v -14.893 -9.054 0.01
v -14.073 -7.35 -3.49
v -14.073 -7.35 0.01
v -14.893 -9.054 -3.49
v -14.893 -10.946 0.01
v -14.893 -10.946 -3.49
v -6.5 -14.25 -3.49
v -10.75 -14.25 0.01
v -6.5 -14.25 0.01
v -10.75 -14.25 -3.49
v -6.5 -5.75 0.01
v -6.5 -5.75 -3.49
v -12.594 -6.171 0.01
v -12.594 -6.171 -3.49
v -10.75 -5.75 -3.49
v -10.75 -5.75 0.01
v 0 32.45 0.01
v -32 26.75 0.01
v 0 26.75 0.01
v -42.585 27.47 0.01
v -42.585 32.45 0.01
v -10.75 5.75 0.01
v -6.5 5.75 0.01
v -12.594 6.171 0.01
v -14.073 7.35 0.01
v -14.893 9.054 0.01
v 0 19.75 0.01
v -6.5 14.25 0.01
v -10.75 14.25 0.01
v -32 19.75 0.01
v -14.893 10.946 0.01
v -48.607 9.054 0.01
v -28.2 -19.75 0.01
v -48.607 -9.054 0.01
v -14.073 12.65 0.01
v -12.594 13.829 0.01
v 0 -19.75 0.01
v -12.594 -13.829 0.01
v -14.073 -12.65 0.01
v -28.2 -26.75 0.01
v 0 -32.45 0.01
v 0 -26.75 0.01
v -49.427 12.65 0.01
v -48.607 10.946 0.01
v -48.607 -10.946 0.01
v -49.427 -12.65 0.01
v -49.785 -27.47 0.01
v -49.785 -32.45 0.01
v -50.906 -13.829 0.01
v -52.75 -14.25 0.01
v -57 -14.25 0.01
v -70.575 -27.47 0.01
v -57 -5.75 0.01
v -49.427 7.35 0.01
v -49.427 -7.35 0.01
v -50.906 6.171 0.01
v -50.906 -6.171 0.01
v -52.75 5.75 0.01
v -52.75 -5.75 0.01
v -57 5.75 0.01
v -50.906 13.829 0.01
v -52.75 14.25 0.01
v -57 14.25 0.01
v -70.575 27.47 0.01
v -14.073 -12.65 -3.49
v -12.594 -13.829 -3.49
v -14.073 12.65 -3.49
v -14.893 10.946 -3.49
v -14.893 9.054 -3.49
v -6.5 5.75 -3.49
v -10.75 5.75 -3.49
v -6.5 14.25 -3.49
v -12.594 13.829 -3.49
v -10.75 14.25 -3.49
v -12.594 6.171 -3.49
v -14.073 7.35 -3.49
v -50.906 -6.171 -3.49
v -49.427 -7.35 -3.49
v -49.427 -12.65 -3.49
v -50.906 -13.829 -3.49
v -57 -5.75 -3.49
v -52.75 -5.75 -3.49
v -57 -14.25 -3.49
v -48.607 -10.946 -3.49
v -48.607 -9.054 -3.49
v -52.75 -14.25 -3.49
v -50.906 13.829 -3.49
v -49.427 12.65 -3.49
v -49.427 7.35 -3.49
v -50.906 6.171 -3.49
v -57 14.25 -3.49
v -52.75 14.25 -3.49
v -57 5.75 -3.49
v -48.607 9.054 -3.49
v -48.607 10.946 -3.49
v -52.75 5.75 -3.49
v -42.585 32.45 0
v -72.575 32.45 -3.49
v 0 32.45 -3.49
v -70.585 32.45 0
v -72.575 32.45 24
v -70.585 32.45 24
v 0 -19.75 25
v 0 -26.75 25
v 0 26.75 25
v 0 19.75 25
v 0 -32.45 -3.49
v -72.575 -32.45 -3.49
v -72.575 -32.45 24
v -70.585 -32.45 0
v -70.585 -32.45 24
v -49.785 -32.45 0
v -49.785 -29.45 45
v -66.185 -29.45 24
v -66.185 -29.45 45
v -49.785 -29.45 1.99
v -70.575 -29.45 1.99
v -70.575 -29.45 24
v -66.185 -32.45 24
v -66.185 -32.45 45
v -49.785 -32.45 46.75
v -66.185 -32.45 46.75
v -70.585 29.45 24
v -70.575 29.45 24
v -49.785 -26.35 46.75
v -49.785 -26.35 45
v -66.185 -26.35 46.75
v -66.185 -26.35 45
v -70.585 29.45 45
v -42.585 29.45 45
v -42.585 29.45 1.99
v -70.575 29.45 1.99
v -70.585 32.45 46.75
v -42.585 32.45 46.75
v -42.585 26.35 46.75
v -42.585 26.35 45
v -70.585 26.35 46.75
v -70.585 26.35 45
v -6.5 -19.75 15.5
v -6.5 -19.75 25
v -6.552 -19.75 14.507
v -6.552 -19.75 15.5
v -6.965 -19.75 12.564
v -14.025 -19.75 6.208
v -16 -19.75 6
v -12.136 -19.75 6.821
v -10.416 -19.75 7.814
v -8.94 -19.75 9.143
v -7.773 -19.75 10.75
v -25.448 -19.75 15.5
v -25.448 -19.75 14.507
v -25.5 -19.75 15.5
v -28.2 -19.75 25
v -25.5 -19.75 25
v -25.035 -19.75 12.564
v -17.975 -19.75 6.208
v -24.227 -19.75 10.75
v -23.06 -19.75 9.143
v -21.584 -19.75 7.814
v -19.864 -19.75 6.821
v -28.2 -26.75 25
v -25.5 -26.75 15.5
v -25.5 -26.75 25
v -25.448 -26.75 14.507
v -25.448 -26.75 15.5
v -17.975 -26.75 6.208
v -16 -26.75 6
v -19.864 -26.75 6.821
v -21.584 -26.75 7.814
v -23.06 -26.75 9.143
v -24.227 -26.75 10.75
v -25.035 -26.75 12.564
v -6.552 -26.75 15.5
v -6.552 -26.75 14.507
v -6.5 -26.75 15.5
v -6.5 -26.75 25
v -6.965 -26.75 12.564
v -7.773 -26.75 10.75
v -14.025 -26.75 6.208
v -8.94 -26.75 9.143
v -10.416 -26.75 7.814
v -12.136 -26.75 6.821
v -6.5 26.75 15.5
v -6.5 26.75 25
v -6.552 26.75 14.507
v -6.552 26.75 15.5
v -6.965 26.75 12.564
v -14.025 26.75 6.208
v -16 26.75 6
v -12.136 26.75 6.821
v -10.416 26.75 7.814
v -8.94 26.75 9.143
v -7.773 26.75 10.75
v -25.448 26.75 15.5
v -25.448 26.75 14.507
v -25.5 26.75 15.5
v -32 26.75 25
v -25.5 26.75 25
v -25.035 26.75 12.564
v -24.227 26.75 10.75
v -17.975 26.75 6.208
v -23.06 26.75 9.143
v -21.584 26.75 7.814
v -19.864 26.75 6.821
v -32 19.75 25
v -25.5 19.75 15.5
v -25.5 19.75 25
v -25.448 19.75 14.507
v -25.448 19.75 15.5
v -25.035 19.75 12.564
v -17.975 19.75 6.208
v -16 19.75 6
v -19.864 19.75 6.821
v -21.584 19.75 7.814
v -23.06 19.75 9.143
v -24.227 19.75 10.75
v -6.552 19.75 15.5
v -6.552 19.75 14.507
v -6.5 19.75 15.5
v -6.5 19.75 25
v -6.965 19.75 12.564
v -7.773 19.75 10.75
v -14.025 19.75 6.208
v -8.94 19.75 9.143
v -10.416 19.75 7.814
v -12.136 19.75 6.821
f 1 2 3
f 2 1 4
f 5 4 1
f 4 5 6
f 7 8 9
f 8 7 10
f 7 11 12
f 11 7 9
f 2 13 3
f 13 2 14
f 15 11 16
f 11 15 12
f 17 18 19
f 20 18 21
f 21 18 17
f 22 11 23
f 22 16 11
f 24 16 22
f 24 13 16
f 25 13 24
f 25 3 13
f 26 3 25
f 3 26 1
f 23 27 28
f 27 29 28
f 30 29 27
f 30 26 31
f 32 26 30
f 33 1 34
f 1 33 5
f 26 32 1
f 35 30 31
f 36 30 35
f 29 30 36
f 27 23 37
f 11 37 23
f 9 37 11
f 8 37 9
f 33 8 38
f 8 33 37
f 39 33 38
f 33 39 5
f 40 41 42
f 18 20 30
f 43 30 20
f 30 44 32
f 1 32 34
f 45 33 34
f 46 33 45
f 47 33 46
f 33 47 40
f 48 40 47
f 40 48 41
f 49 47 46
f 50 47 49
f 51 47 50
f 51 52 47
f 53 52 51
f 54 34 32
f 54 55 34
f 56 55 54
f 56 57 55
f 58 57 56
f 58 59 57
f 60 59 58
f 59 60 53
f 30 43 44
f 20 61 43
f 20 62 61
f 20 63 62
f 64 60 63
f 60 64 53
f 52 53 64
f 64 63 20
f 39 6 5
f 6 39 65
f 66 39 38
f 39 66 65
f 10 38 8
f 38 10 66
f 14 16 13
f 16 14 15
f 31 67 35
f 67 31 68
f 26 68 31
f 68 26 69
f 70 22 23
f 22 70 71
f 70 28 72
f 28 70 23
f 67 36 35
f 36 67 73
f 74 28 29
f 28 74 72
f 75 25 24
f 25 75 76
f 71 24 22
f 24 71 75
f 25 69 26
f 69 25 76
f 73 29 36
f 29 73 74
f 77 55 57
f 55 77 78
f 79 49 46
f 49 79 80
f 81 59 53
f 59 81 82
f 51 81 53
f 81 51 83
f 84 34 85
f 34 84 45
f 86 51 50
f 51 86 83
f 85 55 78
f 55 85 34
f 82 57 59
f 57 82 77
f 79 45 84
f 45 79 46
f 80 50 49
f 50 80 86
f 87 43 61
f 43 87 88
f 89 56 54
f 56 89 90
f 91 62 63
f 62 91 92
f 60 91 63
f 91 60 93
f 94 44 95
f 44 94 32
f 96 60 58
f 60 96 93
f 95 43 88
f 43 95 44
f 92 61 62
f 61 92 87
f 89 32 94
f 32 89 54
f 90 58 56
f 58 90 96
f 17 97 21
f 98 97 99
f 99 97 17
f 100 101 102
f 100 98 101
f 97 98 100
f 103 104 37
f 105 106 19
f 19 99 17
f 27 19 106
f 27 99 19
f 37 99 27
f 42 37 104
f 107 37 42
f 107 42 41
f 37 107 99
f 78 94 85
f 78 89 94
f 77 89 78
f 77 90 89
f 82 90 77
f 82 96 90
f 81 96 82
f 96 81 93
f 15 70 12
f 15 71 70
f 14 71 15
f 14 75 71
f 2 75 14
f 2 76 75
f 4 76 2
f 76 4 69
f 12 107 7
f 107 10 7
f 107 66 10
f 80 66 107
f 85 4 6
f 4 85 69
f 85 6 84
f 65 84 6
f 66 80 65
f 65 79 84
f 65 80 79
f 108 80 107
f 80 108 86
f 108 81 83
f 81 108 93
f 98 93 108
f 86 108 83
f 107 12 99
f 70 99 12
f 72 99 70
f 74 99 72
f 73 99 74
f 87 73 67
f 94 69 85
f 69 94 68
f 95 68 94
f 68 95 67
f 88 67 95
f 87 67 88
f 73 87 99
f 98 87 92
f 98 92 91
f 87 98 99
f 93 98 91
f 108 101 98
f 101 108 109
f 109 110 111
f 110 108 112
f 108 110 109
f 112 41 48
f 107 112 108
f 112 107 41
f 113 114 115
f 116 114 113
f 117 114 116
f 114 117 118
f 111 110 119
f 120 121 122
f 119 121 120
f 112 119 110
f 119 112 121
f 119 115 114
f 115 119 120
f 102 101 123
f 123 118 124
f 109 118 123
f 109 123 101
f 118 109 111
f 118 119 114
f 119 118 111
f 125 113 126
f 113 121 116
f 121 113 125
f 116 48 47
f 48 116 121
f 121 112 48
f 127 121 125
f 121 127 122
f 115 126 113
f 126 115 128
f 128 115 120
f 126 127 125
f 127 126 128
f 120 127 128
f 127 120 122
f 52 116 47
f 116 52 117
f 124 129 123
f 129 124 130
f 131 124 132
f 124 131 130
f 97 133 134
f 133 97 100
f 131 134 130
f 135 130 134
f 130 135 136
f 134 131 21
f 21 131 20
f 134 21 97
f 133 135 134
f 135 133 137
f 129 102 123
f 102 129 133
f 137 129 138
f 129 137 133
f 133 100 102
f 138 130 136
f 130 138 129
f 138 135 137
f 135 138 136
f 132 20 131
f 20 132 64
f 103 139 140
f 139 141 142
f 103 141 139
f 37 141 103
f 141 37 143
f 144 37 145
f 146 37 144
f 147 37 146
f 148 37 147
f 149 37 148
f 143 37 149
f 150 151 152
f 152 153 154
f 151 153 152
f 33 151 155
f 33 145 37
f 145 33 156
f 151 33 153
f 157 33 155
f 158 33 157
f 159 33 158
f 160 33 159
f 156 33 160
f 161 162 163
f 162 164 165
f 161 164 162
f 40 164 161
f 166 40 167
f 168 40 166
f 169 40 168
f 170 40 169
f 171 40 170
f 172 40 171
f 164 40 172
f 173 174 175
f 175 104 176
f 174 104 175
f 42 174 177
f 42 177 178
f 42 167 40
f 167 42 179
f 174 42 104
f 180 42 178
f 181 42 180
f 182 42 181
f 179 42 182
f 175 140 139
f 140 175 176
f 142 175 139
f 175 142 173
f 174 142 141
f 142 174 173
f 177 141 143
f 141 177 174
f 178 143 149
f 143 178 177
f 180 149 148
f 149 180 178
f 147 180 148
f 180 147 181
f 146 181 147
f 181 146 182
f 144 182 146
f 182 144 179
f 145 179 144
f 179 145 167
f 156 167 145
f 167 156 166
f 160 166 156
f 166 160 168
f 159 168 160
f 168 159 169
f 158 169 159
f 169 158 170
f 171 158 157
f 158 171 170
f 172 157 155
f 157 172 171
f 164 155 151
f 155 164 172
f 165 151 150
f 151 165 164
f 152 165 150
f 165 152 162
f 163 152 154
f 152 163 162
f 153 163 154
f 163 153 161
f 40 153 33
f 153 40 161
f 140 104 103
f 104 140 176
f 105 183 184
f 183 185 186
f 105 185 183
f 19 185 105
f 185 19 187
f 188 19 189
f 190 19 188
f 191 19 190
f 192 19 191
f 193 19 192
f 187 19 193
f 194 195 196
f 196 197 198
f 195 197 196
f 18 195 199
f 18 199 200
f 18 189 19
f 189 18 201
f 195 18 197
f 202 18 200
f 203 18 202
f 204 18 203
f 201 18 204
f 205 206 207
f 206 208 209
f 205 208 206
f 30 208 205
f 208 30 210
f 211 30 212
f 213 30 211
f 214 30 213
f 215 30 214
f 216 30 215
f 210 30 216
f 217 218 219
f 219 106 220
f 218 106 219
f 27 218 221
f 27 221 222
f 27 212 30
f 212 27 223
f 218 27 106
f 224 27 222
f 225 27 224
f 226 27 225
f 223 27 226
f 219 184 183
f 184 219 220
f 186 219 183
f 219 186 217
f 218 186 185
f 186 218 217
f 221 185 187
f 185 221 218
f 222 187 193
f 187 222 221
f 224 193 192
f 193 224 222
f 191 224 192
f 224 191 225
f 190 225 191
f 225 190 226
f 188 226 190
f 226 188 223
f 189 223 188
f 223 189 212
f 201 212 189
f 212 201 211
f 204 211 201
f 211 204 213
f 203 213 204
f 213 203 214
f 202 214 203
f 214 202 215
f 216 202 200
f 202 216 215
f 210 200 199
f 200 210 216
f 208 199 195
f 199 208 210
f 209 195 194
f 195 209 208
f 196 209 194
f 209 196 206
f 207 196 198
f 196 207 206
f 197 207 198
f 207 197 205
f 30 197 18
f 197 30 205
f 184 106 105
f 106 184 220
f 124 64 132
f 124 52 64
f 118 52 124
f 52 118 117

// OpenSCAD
plateThickness = 3.5;
upperArmThickness = 3;
lowerArmThickness = 7;
upperArmSpacing = 58.8;
upperArmHorizontalSpacing = 58.9;
upperCatchLength = 3.1;
upperCatchThickness = 1.75;
upperShelfLength = 24;
upperShelfThickness = 2;
lowerArmHorizontalSpacing = 39.5;
upperArmMainLength = 45;
upperArmGusset = 2;

plateWidth = upperArmHorizontalSpacing + 2 * upperArmThickness;

rodDiameter = 8.15;
rodCatchDiameter = 19;
rodInset = 6 + rodCatchDiameter/2;
lowerArmLength = rodInset+rodCatchDiameter/2;
lowerArmHeight = 2*6.5+rodCatchDiameter;
rodTopZ = lowerArmHeight - rodCatchDiameter / 2 + rodDiameter / 2;
rightUpperArmStartFromRod = 16;
leftUpperArmStartFromRod = 23.2;
rightUpperArmHeight = 28;
leftUpperArmHeight = 16.4;

plateHeight = rodTopZ+rightUpperArmStartFromRod+rightUpperArmHeight+upperShelfThickness;

// for meshing with remixed penholder
mountingBumpDiameter = 8.5;
mountingBumpThickness = 4;
mountingBumpPairsCount = 2;
mountingBumpsHeight = lowerArmHeight/2-rodCatchDiameter/2;
mountingBumpVerticalSpacing = 42;
mountingBumpHorizontalSpacing = 20;


module object() {
nudge = 0.01;

// backplate
difference() {
    translate([nudge,-plateWidth/2,0]) rotate([0,-90,0]) linear_extrude(height=plateThickness) square([plateHeight,plateWidth]);
    for (z = [0:mountingBumpPairsCount-1]) {
        for (sign = [-1:2:1]) {
        verticalAdjust = z%2 != 0 ? mountingBumpDiameter : 0;
        translate([-plateThickness-nudge,sign*mountingBumpHorizontalSpacing/2,mountingBumpsHeight+z*mountingBumpVerticalSpacing+verticalAdjust])
        rotate([90,180*((z%2)),90])
        linear_extrude(height=2*nudge+plateThickness)
         union() {
            translate([0,mountingBumpDiameter/2,0])
            circle(d=mountingBumpDiameter);
            translate([-mountingBumpDiameter/2,0,0]) square([mountingBumpDiameter,mountingBumpDiameter/2]); 
         } 
     } 

    } 
}


// loop over two sides
for (i=[0:1]) {
    sign = i * 2 - 1;
    left = (i==0);
    // left: i = 0, sign = -1
    // right: i = 1, sign = 1
    upperArmStartZ = rodTopZ + (left ? leftUpperArmStartFromRod : rightUpperArmStartFromRod);
    upperArmHeight = ( left ? leftUpperArmHeight : rightUpperArmHeight );

    shelfAreaHeightAdjust = left ? (rightUpperArmStartFromRod+rightUpperArmHeight)-(leftUpperArmStartFromRod+leftUpperArmHeight) : 0;

    // upper arms
    translate([0,sign*(plateWidth/2-upperArmThickness/2),nudge+upperArmStartZ+upperArmHeight/2]) 
    rotate([-sign*90,0,0]) 
        translate([0,-upperArmHeight/2,-upperArmThickness/2]) 
        union() {
        linear_extrude(height=upperArmThickness) 
            union() {
                square([upperArmMainLength+upperCatchThickness, upperArmHeight]);
                if (left) {
                square([upperShelfLength, upperArmHeight+shelfAreaHeightAdjust]);
                }
            }
        translate([upperArmMainLength,0,0])
            rotate([-90,0,0])
            linear_extrude(height=upperArmHeight)
            translate([0,-upperArmThickness])
            square([upperCatchThickness,upperCatchLength+upperArmThickness]);
        rotate([-90,0,0])
            linear_extrude(height=upperArmHeight+shelfAreaHeightAdjust)
            polygon(points=[[-nudge,upperArmGusset],[upperArmGusset,-nudge],[-nudge,-nudge]]);
        }
        
        
    // lower arms
    armHeightAdjustment = (i==0) ? (6.5-2.7) : 0;
    translate([0,sign*(lowerArmHorizontalSpacing/2+lowerArmThickness/2),0]) rotate([90,0,0]) translate([0,0,-lowerArmThickness/2]) linear_extrude(height=lowerArmThickness) 
    difference() {
        square([lowerArmLength, lowerArmHeight-armHeightAdjustment]);
        translate([rodInset,lowerArmHeight/2]) union() {
            circle(r=rodCatchDiameter/2);
            translate([rodCatchDiameter/2,0]) square([rodCatchDiameter,rodCatchDiameter],center=true);
        }
    } 
}  

translate([0,-plateWidth/2,rodTopZ+rightUpperArmStartFromRod+rightUpperArmHeight]) linear_extrude(height=upperShelfThickness) square([upperShelfLength,plateWidth]); 

}

//minkowski() {
rotate([0,-90,0])
    object();
//    cube([0.001,0.001,0.001]);
//}
